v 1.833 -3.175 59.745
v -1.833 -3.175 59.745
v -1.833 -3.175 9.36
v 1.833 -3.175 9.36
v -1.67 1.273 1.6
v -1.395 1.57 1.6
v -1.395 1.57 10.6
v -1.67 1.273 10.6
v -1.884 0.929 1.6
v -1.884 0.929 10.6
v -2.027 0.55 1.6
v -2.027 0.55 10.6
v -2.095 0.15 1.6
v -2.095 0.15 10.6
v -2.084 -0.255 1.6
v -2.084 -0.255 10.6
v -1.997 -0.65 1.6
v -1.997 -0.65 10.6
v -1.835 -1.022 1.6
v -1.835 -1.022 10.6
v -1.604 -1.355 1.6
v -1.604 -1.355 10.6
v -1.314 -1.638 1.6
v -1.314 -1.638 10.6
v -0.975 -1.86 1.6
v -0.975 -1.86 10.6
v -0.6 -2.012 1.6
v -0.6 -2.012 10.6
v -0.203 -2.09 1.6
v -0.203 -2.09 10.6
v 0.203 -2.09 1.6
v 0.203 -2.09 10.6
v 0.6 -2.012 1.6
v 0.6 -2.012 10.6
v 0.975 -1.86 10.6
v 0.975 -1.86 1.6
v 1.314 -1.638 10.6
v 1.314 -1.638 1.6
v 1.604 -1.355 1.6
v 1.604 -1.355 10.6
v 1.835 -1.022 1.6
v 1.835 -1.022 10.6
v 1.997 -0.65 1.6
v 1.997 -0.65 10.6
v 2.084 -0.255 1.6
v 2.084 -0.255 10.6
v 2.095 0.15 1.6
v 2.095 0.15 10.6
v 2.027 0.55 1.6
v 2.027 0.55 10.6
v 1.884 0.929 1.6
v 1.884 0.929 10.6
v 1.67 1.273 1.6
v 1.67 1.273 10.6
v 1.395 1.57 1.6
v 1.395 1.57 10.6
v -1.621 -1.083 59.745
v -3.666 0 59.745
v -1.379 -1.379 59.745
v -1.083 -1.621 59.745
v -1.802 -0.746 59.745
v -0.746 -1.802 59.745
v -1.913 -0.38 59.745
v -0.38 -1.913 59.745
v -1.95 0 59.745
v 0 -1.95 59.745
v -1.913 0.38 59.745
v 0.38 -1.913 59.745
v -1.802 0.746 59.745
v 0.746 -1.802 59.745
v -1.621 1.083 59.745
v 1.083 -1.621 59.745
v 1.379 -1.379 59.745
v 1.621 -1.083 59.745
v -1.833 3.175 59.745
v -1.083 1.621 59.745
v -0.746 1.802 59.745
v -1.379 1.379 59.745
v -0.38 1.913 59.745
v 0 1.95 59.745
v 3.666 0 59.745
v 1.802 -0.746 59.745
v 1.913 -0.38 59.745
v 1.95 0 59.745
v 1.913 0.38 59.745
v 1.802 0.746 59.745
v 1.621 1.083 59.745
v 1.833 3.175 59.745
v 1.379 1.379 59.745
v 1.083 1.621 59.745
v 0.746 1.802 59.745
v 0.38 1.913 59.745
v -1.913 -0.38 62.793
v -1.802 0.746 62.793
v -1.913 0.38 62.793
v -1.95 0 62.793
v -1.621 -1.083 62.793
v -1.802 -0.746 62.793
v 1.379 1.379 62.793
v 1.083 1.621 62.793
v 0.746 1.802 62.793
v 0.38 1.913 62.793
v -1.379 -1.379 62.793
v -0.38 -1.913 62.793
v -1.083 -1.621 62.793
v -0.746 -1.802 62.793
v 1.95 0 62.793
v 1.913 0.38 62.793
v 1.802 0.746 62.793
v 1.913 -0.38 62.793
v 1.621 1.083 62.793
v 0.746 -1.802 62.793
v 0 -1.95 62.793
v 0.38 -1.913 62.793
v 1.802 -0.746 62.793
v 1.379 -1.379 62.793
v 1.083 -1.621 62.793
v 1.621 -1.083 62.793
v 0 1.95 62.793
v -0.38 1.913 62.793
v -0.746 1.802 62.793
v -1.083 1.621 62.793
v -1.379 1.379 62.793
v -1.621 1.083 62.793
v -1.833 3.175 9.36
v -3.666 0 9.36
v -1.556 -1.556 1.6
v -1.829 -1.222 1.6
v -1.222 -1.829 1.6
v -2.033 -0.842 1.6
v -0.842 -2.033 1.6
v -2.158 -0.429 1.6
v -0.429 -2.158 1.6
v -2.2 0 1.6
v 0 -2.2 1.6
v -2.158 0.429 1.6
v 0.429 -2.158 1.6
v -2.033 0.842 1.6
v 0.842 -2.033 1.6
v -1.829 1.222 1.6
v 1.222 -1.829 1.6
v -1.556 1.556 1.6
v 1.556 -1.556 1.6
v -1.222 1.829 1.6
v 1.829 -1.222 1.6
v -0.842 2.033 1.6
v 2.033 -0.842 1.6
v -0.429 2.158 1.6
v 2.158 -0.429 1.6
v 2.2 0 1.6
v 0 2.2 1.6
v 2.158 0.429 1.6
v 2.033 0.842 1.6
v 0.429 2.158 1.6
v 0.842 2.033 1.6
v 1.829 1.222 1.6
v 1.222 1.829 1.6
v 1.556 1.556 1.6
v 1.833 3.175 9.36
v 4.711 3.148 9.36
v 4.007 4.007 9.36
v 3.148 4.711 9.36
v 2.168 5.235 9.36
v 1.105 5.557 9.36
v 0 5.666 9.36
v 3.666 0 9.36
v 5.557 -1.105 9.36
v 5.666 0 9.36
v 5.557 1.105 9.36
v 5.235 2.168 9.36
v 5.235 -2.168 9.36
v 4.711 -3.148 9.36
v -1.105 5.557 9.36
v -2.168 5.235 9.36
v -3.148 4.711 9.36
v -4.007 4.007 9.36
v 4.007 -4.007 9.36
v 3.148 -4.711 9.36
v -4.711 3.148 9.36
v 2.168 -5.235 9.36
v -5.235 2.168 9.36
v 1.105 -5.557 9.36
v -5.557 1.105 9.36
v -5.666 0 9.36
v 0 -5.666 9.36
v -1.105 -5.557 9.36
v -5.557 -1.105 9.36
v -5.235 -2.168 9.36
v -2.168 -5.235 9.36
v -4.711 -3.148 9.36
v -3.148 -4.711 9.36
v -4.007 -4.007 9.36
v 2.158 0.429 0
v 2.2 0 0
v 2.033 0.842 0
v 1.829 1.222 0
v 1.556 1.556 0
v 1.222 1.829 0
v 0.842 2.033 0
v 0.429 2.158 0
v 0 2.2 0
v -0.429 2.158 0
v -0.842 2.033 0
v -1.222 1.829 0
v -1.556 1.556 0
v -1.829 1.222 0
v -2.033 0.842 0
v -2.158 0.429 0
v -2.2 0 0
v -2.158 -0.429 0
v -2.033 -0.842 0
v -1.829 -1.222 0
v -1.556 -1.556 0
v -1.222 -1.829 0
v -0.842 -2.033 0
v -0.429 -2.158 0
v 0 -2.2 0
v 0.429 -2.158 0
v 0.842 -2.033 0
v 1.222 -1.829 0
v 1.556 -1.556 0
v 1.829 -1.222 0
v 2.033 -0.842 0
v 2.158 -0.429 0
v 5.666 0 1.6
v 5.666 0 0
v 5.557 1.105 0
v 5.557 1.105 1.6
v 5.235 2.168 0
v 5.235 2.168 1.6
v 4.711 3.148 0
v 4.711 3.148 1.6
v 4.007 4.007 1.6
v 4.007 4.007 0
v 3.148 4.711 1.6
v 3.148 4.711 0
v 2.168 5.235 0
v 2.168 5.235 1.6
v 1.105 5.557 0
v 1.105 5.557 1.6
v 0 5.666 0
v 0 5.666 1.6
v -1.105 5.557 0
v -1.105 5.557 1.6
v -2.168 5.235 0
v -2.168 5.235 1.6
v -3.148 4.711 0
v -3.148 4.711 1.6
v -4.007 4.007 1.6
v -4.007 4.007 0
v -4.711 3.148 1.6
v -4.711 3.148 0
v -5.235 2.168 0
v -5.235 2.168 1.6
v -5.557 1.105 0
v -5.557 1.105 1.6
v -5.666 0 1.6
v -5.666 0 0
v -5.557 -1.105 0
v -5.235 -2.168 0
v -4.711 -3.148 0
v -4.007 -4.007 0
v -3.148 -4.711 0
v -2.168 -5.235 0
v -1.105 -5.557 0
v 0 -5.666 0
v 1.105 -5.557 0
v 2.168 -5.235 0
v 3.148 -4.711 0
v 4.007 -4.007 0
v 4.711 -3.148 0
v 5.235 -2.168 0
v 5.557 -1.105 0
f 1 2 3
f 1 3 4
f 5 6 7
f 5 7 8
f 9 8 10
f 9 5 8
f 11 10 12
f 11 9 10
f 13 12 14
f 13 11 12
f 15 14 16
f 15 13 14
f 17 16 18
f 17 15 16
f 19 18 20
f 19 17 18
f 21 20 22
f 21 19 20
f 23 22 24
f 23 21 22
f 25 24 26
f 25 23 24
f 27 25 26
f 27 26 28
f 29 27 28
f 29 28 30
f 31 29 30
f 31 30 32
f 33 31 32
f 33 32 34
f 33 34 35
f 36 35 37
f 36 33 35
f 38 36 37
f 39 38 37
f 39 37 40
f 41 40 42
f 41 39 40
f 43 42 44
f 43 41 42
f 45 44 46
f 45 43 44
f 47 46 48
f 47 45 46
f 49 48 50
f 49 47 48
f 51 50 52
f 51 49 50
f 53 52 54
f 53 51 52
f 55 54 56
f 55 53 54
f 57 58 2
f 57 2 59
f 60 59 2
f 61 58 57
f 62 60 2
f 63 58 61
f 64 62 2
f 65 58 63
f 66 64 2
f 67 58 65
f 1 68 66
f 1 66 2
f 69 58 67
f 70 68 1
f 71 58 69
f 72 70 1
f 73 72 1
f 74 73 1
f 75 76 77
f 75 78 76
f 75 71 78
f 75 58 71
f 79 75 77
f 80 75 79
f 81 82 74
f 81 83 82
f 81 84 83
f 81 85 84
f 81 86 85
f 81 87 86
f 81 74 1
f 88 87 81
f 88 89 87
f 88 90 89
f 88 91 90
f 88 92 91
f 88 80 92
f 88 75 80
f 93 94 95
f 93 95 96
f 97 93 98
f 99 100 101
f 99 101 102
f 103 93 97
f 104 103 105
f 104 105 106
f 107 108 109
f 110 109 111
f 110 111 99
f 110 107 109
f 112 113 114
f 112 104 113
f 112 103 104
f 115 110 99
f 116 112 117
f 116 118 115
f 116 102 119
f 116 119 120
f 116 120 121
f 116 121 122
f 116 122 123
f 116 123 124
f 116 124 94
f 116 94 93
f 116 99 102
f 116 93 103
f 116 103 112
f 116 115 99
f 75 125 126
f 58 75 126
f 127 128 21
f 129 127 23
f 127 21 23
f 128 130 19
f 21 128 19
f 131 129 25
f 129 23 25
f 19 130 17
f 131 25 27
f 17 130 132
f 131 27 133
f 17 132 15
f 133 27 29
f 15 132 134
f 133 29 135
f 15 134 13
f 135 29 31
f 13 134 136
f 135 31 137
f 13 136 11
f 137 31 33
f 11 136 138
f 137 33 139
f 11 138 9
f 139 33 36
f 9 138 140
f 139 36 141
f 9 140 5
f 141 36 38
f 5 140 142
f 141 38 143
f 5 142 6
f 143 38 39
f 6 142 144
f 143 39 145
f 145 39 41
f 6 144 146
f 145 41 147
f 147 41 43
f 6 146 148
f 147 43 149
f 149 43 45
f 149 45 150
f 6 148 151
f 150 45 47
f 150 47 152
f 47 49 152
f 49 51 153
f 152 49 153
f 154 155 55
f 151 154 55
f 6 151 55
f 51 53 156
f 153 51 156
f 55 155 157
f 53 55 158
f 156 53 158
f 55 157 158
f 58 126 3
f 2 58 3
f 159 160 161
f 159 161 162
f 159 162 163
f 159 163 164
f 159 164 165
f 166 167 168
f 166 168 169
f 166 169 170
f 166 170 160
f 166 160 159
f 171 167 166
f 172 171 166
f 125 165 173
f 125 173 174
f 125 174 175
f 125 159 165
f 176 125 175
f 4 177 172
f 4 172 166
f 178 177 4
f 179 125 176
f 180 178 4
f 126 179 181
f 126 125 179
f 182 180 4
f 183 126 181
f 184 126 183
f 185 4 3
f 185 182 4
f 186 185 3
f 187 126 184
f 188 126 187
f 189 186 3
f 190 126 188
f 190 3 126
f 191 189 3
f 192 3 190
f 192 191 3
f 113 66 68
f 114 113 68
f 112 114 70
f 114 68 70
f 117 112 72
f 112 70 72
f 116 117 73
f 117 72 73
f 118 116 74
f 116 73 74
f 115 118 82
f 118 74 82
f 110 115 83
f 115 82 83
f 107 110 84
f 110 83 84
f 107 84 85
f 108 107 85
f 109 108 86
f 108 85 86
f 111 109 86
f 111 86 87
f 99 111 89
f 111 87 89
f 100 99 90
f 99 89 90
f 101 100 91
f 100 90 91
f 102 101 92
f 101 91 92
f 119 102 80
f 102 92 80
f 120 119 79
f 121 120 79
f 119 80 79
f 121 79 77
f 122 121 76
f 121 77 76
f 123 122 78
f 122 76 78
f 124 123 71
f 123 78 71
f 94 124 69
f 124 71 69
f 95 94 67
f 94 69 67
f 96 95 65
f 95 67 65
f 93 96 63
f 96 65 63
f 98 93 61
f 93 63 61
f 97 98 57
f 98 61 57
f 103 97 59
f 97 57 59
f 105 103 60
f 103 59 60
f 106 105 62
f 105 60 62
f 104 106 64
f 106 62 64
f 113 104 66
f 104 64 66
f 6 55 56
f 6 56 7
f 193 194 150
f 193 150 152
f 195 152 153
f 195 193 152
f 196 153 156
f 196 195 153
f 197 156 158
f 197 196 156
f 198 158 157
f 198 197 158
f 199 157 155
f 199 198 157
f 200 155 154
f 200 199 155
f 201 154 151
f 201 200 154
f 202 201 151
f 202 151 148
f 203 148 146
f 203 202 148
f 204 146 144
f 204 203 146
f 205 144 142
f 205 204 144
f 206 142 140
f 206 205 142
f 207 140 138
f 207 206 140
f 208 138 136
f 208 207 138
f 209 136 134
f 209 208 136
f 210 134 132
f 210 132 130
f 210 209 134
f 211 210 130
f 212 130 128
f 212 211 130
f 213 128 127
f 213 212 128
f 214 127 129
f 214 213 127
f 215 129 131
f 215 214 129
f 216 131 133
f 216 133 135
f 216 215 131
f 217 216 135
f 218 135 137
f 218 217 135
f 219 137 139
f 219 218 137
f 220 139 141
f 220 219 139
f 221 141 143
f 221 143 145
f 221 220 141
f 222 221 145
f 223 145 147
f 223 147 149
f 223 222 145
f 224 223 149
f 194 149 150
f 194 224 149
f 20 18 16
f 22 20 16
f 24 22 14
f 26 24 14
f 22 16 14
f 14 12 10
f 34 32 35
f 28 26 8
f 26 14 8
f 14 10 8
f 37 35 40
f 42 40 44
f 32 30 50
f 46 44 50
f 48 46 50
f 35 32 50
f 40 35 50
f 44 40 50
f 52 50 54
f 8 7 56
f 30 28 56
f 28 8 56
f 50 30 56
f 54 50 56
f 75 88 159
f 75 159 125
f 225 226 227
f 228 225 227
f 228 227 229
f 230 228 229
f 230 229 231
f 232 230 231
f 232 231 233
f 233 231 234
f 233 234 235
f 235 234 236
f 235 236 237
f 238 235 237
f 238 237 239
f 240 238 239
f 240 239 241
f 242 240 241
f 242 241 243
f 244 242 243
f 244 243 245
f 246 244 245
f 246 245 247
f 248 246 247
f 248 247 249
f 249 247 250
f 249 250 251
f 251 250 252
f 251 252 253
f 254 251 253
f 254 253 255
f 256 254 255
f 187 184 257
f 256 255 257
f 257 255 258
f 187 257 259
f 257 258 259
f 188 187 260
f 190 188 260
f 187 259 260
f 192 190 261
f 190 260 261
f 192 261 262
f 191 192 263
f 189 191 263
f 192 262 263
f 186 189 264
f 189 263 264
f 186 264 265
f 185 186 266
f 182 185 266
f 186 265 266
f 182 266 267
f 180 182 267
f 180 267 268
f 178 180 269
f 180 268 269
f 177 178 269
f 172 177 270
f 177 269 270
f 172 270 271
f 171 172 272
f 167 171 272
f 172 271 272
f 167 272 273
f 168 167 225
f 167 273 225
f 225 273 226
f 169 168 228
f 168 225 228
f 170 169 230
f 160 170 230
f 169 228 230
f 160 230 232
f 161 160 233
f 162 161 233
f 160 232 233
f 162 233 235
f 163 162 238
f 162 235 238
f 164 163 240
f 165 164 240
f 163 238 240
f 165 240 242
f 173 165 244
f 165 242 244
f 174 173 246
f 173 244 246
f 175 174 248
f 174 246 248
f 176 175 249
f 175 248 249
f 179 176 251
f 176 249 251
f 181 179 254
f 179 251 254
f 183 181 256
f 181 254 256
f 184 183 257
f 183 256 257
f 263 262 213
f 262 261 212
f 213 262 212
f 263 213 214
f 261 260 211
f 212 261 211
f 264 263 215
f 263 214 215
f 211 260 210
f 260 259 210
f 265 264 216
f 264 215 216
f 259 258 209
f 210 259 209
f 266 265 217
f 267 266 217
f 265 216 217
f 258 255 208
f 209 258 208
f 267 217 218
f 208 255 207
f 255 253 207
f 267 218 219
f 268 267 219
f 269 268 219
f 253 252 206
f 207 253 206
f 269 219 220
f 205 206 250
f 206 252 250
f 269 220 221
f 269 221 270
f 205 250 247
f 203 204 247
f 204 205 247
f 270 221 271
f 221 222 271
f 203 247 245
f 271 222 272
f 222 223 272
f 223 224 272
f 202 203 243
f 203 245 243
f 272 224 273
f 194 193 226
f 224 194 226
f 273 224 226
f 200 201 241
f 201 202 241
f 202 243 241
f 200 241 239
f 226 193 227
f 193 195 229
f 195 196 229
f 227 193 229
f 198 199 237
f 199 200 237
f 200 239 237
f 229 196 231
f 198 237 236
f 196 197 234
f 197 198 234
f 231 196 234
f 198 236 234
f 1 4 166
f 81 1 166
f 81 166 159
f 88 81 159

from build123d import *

# Parameters (mm, degrees)
HEX_EXTRUDE_DEPTH      = 58.145
MOTOR_SHAFT_DEPTH      = 9
SKETCH15_R             = 5.666174209
SKETCH15_R_2           = 2.2
MOTOR_SPACER_DEPTH     = 1.6
SKETCH16_R             = 5.666174209
HUB_INNER_SPACER_DEPTH = 7.76
SKETCH14_R             = 1.95
BEARING_DEPTH          = 3.048


with BuildPart() as part:
    # Standoff → Hex extrude (new body)
    with BuildSketch(Plane.XY.offset(1.6)):
        Polygon((3.666174209, 0), (1.833087105, 3.175), (-1.833087105, 3.175), (-3.666174209, 0), (-1.833087105, -3.175), (1.833087105, -3.175), align=None)
    extrude(amount=HEX_EXTRUDE_DEPTH)

    # Sketch12 → Motor shaft (cut)
    with BuildSketch(Plane.XY.offset(1.6)):
        with BuildLine():
            Line((1.394668419, 1.57), (-1.394668419, 1.57))
            ThreePointArc((-1.394668419, 1.57), (0, -2.1), (1.394668419, 1.57))
        make_face()
    extrude(amount=MOTOR_SHAFT_DEPTH, mode=Mode.SUBTRACT)

    # Sketch15 → Motor spacer (add)
    with BuildSketch(Plane.XY):
        Circle(SKETCH15_R)
        Circle(SKETCH15_R_2, mode=Mode.SUBTRACT)
    extrude(amount=MOTOR_SPACER_DEPTH)

    # Sketch16 → Hub inner spacer (add)
    with BuildSketch(Plane.XY.offset(1.6)):
        with Locations(Location((0, 0, 0), (0, 0, 180))):
            Circle(SKETCH16_R)
        Polygon((3.666174209, 0), (1.833087105, 3.175), (-1.833087105, 3.175), (-3.666174209, 0), (-1.833087105, -3.175), (1.833087105, -3.175), align=None, mode=Mode.SUBTRACT)
    extrude(amount=HUB_INNER_SPACER_DEPTH)

    # Sketch14 → Bearing (add)
    with BuildSketch(Plane.XY.offset(59.745)):
        with Locations(Location((0, 0, 0), (0, 0, 270))):
            Circle(SKETCH14_R)
    extrude(amount=BEARING_DEPTH)


solid = part.part
